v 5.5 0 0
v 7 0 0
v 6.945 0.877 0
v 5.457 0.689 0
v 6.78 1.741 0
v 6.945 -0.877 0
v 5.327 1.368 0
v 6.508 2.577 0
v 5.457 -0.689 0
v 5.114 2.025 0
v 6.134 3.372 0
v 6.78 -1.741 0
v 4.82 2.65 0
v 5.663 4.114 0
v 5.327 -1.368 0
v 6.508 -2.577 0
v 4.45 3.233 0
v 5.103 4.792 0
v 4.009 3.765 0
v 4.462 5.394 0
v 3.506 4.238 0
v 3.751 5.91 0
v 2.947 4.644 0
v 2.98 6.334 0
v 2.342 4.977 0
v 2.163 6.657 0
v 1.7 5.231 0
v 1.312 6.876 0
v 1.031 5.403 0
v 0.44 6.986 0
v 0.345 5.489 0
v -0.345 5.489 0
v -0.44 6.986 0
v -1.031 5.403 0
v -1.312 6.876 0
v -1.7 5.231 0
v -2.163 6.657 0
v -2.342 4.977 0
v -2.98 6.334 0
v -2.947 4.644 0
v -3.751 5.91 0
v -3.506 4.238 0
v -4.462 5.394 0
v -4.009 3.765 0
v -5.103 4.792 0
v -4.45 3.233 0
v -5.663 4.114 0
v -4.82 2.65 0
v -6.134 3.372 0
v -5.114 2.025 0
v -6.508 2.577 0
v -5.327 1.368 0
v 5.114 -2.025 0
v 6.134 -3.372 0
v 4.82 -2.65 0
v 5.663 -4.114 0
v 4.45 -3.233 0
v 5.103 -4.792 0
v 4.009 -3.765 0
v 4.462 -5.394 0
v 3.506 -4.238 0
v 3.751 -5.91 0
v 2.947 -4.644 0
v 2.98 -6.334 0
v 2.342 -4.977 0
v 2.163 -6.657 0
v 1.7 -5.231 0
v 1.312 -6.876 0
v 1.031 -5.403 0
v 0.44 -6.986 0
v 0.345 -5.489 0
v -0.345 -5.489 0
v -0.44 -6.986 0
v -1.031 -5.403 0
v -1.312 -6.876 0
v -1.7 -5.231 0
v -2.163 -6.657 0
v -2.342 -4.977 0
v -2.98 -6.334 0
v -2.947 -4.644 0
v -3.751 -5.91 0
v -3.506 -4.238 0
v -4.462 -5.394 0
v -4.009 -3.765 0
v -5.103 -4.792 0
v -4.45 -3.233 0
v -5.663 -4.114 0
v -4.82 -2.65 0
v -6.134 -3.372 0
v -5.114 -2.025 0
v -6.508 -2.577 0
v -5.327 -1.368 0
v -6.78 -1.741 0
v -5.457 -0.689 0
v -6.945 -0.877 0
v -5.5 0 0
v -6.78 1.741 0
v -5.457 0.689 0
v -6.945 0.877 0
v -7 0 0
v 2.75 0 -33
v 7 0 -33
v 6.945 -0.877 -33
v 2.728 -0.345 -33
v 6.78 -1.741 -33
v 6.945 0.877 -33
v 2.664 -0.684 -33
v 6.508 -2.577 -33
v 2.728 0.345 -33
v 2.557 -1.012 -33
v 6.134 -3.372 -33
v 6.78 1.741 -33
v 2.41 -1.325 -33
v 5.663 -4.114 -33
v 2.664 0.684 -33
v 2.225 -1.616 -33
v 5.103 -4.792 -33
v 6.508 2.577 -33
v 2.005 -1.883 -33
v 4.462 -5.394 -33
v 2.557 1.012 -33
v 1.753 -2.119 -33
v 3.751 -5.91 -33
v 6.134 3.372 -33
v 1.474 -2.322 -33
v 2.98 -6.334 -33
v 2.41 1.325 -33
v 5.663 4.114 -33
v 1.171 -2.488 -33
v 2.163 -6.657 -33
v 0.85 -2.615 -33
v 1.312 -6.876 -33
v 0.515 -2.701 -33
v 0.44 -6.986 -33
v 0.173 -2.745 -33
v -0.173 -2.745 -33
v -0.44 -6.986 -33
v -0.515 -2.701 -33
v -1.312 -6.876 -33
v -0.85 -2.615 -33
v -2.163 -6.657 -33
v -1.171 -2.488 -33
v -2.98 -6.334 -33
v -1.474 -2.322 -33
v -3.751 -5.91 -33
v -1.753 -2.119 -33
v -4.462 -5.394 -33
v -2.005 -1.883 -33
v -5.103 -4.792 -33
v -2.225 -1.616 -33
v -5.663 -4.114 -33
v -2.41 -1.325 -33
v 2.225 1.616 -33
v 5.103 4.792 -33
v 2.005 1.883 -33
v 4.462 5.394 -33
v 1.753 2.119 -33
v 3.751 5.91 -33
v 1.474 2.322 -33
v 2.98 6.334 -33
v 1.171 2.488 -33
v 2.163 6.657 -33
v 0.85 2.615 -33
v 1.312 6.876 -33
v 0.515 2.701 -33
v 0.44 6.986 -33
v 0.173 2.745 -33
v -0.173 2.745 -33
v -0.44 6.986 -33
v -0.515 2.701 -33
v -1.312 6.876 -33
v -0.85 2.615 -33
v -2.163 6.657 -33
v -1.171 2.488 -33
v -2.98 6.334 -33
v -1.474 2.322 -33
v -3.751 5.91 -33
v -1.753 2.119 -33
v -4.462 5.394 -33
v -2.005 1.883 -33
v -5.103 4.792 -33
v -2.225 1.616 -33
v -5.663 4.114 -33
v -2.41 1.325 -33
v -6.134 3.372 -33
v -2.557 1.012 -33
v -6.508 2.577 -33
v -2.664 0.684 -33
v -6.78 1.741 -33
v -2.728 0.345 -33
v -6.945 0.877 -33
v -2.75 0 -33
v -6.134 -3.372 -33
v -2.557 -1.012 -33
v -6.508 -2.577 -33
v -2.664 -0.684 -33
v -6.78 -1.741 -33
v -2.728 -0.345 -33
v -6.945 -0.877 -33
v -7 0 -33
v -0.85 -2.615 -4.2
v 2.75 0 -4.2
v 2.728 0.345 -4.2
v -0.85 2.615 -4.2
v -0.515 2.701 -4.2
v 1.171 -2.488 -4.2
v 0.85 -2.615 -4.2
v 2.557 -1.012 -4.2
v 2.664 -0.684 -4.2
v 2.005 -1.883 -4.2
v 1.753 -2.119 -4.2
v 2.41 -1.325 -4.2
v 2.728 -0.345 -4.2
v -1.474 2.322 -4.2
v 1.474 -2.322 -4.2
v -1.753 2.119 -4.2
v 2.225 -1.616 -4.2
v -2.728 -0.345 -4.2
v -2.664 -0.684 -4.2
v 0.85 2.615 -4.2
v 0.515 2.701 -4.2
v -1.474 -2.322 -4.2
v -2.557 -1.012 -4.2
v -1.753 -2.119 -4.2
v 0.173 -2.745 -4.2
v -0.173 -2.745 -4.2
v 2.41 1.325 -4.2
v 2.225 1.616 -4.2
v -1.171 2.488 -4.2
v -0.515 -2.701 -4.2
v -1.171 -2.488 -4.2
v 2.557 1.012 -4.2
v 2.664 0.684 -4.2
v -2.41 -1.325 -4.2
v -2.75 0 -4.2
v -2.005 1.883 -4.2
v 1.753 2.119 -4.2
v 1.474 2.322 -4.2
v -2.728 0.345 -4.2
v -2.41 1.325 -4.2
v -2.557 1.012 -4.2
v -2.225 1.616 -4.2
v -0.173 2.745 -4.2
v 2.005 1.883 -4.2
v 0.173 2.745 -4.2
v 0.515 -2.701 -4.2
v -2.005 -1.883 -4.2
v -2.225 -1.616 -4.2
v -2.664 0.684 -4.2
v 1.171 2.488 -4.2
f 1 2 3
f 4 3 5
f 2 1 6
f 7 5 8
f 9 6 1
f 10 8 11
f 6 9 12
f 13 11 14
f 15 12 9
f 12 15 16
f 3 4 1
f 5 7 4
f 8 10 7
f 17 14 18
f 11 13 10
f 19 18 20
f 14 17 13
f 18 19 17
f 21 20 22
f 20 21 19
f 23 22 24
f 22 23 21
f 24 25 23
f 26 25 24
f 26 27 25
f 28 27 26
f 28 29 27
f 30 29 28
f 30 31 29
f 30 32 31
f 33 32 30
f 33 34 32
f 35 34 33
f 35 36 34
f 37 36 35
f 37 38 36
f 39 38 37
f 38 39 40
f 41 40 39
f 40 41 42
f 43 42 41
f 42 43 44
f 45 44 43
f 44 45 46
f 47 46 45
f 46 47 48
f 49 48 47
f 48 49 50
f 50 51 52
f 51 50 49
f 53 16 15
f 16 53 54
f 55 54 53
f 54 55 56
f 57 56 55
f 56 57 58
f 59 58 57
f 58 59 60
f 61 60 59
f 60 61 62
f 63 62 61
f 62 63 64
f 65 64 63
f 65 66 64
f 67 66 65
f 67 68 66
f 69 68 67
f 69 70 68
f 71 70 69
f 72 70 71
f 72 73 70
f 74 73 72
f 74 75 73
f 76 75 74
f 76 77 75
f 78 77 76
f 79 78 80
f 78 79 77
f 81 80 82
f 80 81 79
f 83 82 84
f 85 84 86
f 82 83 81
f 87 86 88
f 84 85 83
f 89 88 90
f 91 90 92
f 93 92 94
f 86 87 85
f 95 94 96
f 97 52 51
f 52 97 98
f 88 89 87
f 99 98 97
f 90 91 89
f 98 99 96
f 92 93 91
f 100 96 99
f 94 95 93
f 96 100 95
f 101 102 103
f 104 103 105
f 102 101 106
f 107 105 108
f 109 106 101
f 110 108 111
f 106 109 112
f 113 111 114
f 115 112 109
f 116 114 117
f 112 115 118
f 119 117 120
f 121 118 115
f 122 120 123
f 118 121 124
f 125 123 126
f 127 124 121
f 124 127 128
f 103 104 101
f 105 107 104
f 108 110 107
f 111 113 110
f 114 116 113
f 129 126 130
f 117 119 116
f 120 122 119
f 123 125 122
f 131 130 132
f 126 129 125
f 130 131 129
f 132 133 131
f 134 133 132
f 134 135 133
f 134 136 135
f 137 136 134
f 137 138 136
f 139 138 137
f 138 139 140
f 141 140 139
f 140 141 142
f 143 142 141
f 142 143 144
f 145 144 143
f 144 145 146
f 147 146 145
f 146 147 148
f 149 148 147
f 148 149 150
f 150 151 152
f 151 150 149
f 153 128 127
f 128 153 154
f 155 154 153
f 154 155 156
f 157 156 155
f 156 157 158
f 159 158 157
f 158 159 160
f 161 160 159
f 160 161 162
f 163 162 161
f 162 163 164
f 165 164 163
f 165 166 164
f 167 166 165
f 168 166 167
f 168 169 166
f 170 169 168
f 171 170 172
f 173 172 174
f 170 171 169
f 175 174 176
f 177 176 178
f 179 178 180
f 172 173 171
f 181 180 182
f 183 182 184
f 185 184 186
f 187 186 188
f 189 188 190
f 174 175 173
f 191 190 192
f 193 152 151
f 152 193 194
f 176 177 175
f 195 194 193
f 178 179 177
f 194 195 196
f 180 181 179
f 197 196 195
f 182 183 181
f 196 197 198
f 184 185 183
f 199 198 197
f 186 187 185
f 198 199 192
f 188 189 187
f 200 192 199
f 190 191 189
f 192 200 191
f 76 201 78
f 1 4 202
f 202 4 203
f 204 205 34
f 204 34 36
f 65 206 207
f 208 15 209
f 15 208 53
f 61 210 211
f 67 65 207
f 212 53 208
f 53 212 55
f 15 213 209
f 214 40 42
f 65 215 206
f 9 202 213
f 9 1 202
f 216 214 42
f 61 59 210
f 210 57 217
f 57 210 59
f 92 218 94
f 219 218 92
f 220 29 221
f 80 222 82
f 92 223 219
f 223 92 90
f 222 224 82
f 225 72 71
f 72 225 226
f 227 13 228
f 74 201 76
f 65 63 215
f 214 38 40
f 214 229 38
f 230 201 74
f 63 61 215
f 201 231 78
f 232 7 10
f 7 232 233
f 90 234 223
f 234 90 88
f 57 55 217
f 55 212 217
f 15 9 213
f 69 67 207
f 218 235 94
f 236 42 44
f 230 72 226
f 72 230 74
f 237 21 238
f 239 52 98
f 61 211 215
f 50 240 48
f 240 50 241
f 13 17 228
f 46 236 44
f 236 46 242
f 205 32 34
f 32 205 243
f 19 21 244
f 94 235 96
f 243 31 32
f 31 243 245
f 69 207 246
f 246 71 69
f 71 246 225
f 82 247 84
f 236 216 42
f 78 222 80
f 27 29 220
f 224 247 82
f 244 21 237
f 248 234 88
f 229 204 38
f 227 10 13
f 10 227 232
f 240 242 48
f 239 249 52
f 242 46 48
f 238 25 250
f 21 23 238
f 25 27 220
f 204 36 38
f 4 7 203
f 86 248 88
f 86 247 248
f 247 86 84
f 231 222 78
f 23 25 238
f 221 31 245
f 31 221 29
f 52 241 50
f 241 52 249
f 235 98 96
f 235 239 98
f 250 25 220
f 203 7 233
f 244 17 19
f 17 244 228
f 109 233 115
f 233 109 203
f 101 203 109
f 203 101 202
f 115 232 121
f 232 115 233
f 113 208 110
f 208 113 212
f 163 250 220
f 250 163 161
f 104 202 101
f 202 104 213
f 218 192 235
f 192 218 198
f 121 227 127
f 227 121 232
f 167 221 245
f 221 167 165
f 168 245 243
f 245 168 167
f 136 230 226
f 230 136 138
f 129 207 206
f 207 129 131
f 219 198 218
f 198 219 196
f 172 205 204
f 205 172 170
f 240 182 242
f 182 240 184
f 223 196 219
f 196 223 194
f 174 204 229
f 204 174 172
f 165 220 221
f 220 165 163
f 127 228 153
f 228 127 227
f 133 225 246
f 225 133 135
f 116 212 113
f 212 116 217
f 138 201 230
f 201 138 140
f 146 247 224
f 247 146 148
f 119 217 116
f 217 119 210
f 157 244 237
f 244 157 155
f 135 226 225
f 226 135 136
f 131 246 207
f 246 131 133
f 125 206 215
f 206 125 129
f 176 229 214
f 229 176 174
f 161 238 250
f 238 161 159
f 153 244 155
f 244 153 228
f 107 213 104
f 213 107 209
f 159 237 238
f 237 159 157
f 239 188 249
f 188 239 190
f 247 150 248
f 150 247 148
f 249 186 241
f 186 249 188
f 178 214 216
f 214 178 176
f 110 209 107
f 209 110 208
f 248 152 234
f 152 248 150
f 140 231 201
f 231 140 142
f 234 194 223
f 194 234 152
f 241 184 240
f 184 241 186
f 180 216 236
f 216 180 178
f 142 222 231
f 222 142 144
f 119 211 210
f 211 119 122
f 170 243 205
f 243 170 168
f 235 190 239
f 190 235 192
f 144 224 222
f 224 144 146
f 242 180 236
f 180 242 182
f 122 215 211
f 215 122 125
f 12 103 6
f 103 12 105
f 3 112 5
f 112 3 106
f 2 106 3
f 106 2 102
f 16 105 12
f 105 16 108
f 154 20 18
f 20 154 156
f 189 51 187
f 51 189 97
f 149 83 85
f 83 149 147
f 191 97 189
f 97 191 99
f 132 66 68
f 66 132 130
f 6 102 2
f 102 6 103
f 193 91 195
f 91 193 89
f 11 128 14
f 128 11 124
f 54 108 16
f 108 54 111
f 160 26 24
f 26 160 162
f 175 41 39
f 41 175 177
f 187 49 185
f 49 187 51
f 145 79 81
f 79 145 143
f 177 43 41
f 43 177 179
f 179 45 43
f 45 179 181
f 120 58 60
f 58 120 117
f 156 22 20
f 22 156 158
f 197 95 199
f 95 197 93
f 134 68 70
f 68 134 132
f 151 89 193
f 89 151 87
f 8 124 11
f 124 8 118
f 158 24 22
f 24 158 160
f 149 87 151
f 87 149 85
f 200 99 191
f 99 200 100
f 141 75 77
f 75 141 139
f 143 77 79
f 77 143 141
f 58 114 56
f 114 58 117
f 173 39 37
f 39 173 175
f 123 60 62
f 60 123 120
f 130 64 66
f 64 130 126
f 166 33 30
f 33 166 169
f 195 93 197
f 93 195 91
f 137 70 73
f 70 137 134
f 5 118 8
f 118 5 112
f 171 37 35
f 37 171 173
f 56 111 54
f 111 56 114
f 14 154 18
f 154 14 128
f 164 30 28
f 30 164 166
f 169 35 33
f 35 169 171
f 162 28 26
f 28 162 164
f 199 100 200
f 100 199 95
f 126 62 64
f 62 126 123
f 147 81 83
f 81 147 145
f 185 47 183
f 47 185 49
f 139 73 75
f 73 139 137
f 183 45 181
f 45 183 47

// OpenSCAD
$fn = 50;


difference() {
	union() {
		translate(v = [0, 0, -33.0000000000]) {
			cylinder(h = 33, r = 7.0000000000);
		}
		cylinder(h = 0, r = 17.0000000000);
	}
	union() {
		translate(v = [0, 0, 0]) {
			rotate(a = [0, 0, 0]) {
				difference() {
					union() {
						#translate(v = [0, 0, -33.0000000000]) {
							cylinder(h = 33, r = 2.2500000000);
						}
						#translate(v = [0, 0, -4.2000000000]) {
							cylinder(h = 4.2000000000, r1 = 2.7500000000, r2 = 5.5000000000);
						}
						#translate(v = [0, 0, -33.0000000000]) {
							cylinder(h = 33, r = 2.7500000000);
						}
						#translate(v = [0, 0, -33.0000000000]) {
							cylinder(h = 33, r = 2.2500000000);
						}
					}
					union();
				}
			}
		}
	}
}
